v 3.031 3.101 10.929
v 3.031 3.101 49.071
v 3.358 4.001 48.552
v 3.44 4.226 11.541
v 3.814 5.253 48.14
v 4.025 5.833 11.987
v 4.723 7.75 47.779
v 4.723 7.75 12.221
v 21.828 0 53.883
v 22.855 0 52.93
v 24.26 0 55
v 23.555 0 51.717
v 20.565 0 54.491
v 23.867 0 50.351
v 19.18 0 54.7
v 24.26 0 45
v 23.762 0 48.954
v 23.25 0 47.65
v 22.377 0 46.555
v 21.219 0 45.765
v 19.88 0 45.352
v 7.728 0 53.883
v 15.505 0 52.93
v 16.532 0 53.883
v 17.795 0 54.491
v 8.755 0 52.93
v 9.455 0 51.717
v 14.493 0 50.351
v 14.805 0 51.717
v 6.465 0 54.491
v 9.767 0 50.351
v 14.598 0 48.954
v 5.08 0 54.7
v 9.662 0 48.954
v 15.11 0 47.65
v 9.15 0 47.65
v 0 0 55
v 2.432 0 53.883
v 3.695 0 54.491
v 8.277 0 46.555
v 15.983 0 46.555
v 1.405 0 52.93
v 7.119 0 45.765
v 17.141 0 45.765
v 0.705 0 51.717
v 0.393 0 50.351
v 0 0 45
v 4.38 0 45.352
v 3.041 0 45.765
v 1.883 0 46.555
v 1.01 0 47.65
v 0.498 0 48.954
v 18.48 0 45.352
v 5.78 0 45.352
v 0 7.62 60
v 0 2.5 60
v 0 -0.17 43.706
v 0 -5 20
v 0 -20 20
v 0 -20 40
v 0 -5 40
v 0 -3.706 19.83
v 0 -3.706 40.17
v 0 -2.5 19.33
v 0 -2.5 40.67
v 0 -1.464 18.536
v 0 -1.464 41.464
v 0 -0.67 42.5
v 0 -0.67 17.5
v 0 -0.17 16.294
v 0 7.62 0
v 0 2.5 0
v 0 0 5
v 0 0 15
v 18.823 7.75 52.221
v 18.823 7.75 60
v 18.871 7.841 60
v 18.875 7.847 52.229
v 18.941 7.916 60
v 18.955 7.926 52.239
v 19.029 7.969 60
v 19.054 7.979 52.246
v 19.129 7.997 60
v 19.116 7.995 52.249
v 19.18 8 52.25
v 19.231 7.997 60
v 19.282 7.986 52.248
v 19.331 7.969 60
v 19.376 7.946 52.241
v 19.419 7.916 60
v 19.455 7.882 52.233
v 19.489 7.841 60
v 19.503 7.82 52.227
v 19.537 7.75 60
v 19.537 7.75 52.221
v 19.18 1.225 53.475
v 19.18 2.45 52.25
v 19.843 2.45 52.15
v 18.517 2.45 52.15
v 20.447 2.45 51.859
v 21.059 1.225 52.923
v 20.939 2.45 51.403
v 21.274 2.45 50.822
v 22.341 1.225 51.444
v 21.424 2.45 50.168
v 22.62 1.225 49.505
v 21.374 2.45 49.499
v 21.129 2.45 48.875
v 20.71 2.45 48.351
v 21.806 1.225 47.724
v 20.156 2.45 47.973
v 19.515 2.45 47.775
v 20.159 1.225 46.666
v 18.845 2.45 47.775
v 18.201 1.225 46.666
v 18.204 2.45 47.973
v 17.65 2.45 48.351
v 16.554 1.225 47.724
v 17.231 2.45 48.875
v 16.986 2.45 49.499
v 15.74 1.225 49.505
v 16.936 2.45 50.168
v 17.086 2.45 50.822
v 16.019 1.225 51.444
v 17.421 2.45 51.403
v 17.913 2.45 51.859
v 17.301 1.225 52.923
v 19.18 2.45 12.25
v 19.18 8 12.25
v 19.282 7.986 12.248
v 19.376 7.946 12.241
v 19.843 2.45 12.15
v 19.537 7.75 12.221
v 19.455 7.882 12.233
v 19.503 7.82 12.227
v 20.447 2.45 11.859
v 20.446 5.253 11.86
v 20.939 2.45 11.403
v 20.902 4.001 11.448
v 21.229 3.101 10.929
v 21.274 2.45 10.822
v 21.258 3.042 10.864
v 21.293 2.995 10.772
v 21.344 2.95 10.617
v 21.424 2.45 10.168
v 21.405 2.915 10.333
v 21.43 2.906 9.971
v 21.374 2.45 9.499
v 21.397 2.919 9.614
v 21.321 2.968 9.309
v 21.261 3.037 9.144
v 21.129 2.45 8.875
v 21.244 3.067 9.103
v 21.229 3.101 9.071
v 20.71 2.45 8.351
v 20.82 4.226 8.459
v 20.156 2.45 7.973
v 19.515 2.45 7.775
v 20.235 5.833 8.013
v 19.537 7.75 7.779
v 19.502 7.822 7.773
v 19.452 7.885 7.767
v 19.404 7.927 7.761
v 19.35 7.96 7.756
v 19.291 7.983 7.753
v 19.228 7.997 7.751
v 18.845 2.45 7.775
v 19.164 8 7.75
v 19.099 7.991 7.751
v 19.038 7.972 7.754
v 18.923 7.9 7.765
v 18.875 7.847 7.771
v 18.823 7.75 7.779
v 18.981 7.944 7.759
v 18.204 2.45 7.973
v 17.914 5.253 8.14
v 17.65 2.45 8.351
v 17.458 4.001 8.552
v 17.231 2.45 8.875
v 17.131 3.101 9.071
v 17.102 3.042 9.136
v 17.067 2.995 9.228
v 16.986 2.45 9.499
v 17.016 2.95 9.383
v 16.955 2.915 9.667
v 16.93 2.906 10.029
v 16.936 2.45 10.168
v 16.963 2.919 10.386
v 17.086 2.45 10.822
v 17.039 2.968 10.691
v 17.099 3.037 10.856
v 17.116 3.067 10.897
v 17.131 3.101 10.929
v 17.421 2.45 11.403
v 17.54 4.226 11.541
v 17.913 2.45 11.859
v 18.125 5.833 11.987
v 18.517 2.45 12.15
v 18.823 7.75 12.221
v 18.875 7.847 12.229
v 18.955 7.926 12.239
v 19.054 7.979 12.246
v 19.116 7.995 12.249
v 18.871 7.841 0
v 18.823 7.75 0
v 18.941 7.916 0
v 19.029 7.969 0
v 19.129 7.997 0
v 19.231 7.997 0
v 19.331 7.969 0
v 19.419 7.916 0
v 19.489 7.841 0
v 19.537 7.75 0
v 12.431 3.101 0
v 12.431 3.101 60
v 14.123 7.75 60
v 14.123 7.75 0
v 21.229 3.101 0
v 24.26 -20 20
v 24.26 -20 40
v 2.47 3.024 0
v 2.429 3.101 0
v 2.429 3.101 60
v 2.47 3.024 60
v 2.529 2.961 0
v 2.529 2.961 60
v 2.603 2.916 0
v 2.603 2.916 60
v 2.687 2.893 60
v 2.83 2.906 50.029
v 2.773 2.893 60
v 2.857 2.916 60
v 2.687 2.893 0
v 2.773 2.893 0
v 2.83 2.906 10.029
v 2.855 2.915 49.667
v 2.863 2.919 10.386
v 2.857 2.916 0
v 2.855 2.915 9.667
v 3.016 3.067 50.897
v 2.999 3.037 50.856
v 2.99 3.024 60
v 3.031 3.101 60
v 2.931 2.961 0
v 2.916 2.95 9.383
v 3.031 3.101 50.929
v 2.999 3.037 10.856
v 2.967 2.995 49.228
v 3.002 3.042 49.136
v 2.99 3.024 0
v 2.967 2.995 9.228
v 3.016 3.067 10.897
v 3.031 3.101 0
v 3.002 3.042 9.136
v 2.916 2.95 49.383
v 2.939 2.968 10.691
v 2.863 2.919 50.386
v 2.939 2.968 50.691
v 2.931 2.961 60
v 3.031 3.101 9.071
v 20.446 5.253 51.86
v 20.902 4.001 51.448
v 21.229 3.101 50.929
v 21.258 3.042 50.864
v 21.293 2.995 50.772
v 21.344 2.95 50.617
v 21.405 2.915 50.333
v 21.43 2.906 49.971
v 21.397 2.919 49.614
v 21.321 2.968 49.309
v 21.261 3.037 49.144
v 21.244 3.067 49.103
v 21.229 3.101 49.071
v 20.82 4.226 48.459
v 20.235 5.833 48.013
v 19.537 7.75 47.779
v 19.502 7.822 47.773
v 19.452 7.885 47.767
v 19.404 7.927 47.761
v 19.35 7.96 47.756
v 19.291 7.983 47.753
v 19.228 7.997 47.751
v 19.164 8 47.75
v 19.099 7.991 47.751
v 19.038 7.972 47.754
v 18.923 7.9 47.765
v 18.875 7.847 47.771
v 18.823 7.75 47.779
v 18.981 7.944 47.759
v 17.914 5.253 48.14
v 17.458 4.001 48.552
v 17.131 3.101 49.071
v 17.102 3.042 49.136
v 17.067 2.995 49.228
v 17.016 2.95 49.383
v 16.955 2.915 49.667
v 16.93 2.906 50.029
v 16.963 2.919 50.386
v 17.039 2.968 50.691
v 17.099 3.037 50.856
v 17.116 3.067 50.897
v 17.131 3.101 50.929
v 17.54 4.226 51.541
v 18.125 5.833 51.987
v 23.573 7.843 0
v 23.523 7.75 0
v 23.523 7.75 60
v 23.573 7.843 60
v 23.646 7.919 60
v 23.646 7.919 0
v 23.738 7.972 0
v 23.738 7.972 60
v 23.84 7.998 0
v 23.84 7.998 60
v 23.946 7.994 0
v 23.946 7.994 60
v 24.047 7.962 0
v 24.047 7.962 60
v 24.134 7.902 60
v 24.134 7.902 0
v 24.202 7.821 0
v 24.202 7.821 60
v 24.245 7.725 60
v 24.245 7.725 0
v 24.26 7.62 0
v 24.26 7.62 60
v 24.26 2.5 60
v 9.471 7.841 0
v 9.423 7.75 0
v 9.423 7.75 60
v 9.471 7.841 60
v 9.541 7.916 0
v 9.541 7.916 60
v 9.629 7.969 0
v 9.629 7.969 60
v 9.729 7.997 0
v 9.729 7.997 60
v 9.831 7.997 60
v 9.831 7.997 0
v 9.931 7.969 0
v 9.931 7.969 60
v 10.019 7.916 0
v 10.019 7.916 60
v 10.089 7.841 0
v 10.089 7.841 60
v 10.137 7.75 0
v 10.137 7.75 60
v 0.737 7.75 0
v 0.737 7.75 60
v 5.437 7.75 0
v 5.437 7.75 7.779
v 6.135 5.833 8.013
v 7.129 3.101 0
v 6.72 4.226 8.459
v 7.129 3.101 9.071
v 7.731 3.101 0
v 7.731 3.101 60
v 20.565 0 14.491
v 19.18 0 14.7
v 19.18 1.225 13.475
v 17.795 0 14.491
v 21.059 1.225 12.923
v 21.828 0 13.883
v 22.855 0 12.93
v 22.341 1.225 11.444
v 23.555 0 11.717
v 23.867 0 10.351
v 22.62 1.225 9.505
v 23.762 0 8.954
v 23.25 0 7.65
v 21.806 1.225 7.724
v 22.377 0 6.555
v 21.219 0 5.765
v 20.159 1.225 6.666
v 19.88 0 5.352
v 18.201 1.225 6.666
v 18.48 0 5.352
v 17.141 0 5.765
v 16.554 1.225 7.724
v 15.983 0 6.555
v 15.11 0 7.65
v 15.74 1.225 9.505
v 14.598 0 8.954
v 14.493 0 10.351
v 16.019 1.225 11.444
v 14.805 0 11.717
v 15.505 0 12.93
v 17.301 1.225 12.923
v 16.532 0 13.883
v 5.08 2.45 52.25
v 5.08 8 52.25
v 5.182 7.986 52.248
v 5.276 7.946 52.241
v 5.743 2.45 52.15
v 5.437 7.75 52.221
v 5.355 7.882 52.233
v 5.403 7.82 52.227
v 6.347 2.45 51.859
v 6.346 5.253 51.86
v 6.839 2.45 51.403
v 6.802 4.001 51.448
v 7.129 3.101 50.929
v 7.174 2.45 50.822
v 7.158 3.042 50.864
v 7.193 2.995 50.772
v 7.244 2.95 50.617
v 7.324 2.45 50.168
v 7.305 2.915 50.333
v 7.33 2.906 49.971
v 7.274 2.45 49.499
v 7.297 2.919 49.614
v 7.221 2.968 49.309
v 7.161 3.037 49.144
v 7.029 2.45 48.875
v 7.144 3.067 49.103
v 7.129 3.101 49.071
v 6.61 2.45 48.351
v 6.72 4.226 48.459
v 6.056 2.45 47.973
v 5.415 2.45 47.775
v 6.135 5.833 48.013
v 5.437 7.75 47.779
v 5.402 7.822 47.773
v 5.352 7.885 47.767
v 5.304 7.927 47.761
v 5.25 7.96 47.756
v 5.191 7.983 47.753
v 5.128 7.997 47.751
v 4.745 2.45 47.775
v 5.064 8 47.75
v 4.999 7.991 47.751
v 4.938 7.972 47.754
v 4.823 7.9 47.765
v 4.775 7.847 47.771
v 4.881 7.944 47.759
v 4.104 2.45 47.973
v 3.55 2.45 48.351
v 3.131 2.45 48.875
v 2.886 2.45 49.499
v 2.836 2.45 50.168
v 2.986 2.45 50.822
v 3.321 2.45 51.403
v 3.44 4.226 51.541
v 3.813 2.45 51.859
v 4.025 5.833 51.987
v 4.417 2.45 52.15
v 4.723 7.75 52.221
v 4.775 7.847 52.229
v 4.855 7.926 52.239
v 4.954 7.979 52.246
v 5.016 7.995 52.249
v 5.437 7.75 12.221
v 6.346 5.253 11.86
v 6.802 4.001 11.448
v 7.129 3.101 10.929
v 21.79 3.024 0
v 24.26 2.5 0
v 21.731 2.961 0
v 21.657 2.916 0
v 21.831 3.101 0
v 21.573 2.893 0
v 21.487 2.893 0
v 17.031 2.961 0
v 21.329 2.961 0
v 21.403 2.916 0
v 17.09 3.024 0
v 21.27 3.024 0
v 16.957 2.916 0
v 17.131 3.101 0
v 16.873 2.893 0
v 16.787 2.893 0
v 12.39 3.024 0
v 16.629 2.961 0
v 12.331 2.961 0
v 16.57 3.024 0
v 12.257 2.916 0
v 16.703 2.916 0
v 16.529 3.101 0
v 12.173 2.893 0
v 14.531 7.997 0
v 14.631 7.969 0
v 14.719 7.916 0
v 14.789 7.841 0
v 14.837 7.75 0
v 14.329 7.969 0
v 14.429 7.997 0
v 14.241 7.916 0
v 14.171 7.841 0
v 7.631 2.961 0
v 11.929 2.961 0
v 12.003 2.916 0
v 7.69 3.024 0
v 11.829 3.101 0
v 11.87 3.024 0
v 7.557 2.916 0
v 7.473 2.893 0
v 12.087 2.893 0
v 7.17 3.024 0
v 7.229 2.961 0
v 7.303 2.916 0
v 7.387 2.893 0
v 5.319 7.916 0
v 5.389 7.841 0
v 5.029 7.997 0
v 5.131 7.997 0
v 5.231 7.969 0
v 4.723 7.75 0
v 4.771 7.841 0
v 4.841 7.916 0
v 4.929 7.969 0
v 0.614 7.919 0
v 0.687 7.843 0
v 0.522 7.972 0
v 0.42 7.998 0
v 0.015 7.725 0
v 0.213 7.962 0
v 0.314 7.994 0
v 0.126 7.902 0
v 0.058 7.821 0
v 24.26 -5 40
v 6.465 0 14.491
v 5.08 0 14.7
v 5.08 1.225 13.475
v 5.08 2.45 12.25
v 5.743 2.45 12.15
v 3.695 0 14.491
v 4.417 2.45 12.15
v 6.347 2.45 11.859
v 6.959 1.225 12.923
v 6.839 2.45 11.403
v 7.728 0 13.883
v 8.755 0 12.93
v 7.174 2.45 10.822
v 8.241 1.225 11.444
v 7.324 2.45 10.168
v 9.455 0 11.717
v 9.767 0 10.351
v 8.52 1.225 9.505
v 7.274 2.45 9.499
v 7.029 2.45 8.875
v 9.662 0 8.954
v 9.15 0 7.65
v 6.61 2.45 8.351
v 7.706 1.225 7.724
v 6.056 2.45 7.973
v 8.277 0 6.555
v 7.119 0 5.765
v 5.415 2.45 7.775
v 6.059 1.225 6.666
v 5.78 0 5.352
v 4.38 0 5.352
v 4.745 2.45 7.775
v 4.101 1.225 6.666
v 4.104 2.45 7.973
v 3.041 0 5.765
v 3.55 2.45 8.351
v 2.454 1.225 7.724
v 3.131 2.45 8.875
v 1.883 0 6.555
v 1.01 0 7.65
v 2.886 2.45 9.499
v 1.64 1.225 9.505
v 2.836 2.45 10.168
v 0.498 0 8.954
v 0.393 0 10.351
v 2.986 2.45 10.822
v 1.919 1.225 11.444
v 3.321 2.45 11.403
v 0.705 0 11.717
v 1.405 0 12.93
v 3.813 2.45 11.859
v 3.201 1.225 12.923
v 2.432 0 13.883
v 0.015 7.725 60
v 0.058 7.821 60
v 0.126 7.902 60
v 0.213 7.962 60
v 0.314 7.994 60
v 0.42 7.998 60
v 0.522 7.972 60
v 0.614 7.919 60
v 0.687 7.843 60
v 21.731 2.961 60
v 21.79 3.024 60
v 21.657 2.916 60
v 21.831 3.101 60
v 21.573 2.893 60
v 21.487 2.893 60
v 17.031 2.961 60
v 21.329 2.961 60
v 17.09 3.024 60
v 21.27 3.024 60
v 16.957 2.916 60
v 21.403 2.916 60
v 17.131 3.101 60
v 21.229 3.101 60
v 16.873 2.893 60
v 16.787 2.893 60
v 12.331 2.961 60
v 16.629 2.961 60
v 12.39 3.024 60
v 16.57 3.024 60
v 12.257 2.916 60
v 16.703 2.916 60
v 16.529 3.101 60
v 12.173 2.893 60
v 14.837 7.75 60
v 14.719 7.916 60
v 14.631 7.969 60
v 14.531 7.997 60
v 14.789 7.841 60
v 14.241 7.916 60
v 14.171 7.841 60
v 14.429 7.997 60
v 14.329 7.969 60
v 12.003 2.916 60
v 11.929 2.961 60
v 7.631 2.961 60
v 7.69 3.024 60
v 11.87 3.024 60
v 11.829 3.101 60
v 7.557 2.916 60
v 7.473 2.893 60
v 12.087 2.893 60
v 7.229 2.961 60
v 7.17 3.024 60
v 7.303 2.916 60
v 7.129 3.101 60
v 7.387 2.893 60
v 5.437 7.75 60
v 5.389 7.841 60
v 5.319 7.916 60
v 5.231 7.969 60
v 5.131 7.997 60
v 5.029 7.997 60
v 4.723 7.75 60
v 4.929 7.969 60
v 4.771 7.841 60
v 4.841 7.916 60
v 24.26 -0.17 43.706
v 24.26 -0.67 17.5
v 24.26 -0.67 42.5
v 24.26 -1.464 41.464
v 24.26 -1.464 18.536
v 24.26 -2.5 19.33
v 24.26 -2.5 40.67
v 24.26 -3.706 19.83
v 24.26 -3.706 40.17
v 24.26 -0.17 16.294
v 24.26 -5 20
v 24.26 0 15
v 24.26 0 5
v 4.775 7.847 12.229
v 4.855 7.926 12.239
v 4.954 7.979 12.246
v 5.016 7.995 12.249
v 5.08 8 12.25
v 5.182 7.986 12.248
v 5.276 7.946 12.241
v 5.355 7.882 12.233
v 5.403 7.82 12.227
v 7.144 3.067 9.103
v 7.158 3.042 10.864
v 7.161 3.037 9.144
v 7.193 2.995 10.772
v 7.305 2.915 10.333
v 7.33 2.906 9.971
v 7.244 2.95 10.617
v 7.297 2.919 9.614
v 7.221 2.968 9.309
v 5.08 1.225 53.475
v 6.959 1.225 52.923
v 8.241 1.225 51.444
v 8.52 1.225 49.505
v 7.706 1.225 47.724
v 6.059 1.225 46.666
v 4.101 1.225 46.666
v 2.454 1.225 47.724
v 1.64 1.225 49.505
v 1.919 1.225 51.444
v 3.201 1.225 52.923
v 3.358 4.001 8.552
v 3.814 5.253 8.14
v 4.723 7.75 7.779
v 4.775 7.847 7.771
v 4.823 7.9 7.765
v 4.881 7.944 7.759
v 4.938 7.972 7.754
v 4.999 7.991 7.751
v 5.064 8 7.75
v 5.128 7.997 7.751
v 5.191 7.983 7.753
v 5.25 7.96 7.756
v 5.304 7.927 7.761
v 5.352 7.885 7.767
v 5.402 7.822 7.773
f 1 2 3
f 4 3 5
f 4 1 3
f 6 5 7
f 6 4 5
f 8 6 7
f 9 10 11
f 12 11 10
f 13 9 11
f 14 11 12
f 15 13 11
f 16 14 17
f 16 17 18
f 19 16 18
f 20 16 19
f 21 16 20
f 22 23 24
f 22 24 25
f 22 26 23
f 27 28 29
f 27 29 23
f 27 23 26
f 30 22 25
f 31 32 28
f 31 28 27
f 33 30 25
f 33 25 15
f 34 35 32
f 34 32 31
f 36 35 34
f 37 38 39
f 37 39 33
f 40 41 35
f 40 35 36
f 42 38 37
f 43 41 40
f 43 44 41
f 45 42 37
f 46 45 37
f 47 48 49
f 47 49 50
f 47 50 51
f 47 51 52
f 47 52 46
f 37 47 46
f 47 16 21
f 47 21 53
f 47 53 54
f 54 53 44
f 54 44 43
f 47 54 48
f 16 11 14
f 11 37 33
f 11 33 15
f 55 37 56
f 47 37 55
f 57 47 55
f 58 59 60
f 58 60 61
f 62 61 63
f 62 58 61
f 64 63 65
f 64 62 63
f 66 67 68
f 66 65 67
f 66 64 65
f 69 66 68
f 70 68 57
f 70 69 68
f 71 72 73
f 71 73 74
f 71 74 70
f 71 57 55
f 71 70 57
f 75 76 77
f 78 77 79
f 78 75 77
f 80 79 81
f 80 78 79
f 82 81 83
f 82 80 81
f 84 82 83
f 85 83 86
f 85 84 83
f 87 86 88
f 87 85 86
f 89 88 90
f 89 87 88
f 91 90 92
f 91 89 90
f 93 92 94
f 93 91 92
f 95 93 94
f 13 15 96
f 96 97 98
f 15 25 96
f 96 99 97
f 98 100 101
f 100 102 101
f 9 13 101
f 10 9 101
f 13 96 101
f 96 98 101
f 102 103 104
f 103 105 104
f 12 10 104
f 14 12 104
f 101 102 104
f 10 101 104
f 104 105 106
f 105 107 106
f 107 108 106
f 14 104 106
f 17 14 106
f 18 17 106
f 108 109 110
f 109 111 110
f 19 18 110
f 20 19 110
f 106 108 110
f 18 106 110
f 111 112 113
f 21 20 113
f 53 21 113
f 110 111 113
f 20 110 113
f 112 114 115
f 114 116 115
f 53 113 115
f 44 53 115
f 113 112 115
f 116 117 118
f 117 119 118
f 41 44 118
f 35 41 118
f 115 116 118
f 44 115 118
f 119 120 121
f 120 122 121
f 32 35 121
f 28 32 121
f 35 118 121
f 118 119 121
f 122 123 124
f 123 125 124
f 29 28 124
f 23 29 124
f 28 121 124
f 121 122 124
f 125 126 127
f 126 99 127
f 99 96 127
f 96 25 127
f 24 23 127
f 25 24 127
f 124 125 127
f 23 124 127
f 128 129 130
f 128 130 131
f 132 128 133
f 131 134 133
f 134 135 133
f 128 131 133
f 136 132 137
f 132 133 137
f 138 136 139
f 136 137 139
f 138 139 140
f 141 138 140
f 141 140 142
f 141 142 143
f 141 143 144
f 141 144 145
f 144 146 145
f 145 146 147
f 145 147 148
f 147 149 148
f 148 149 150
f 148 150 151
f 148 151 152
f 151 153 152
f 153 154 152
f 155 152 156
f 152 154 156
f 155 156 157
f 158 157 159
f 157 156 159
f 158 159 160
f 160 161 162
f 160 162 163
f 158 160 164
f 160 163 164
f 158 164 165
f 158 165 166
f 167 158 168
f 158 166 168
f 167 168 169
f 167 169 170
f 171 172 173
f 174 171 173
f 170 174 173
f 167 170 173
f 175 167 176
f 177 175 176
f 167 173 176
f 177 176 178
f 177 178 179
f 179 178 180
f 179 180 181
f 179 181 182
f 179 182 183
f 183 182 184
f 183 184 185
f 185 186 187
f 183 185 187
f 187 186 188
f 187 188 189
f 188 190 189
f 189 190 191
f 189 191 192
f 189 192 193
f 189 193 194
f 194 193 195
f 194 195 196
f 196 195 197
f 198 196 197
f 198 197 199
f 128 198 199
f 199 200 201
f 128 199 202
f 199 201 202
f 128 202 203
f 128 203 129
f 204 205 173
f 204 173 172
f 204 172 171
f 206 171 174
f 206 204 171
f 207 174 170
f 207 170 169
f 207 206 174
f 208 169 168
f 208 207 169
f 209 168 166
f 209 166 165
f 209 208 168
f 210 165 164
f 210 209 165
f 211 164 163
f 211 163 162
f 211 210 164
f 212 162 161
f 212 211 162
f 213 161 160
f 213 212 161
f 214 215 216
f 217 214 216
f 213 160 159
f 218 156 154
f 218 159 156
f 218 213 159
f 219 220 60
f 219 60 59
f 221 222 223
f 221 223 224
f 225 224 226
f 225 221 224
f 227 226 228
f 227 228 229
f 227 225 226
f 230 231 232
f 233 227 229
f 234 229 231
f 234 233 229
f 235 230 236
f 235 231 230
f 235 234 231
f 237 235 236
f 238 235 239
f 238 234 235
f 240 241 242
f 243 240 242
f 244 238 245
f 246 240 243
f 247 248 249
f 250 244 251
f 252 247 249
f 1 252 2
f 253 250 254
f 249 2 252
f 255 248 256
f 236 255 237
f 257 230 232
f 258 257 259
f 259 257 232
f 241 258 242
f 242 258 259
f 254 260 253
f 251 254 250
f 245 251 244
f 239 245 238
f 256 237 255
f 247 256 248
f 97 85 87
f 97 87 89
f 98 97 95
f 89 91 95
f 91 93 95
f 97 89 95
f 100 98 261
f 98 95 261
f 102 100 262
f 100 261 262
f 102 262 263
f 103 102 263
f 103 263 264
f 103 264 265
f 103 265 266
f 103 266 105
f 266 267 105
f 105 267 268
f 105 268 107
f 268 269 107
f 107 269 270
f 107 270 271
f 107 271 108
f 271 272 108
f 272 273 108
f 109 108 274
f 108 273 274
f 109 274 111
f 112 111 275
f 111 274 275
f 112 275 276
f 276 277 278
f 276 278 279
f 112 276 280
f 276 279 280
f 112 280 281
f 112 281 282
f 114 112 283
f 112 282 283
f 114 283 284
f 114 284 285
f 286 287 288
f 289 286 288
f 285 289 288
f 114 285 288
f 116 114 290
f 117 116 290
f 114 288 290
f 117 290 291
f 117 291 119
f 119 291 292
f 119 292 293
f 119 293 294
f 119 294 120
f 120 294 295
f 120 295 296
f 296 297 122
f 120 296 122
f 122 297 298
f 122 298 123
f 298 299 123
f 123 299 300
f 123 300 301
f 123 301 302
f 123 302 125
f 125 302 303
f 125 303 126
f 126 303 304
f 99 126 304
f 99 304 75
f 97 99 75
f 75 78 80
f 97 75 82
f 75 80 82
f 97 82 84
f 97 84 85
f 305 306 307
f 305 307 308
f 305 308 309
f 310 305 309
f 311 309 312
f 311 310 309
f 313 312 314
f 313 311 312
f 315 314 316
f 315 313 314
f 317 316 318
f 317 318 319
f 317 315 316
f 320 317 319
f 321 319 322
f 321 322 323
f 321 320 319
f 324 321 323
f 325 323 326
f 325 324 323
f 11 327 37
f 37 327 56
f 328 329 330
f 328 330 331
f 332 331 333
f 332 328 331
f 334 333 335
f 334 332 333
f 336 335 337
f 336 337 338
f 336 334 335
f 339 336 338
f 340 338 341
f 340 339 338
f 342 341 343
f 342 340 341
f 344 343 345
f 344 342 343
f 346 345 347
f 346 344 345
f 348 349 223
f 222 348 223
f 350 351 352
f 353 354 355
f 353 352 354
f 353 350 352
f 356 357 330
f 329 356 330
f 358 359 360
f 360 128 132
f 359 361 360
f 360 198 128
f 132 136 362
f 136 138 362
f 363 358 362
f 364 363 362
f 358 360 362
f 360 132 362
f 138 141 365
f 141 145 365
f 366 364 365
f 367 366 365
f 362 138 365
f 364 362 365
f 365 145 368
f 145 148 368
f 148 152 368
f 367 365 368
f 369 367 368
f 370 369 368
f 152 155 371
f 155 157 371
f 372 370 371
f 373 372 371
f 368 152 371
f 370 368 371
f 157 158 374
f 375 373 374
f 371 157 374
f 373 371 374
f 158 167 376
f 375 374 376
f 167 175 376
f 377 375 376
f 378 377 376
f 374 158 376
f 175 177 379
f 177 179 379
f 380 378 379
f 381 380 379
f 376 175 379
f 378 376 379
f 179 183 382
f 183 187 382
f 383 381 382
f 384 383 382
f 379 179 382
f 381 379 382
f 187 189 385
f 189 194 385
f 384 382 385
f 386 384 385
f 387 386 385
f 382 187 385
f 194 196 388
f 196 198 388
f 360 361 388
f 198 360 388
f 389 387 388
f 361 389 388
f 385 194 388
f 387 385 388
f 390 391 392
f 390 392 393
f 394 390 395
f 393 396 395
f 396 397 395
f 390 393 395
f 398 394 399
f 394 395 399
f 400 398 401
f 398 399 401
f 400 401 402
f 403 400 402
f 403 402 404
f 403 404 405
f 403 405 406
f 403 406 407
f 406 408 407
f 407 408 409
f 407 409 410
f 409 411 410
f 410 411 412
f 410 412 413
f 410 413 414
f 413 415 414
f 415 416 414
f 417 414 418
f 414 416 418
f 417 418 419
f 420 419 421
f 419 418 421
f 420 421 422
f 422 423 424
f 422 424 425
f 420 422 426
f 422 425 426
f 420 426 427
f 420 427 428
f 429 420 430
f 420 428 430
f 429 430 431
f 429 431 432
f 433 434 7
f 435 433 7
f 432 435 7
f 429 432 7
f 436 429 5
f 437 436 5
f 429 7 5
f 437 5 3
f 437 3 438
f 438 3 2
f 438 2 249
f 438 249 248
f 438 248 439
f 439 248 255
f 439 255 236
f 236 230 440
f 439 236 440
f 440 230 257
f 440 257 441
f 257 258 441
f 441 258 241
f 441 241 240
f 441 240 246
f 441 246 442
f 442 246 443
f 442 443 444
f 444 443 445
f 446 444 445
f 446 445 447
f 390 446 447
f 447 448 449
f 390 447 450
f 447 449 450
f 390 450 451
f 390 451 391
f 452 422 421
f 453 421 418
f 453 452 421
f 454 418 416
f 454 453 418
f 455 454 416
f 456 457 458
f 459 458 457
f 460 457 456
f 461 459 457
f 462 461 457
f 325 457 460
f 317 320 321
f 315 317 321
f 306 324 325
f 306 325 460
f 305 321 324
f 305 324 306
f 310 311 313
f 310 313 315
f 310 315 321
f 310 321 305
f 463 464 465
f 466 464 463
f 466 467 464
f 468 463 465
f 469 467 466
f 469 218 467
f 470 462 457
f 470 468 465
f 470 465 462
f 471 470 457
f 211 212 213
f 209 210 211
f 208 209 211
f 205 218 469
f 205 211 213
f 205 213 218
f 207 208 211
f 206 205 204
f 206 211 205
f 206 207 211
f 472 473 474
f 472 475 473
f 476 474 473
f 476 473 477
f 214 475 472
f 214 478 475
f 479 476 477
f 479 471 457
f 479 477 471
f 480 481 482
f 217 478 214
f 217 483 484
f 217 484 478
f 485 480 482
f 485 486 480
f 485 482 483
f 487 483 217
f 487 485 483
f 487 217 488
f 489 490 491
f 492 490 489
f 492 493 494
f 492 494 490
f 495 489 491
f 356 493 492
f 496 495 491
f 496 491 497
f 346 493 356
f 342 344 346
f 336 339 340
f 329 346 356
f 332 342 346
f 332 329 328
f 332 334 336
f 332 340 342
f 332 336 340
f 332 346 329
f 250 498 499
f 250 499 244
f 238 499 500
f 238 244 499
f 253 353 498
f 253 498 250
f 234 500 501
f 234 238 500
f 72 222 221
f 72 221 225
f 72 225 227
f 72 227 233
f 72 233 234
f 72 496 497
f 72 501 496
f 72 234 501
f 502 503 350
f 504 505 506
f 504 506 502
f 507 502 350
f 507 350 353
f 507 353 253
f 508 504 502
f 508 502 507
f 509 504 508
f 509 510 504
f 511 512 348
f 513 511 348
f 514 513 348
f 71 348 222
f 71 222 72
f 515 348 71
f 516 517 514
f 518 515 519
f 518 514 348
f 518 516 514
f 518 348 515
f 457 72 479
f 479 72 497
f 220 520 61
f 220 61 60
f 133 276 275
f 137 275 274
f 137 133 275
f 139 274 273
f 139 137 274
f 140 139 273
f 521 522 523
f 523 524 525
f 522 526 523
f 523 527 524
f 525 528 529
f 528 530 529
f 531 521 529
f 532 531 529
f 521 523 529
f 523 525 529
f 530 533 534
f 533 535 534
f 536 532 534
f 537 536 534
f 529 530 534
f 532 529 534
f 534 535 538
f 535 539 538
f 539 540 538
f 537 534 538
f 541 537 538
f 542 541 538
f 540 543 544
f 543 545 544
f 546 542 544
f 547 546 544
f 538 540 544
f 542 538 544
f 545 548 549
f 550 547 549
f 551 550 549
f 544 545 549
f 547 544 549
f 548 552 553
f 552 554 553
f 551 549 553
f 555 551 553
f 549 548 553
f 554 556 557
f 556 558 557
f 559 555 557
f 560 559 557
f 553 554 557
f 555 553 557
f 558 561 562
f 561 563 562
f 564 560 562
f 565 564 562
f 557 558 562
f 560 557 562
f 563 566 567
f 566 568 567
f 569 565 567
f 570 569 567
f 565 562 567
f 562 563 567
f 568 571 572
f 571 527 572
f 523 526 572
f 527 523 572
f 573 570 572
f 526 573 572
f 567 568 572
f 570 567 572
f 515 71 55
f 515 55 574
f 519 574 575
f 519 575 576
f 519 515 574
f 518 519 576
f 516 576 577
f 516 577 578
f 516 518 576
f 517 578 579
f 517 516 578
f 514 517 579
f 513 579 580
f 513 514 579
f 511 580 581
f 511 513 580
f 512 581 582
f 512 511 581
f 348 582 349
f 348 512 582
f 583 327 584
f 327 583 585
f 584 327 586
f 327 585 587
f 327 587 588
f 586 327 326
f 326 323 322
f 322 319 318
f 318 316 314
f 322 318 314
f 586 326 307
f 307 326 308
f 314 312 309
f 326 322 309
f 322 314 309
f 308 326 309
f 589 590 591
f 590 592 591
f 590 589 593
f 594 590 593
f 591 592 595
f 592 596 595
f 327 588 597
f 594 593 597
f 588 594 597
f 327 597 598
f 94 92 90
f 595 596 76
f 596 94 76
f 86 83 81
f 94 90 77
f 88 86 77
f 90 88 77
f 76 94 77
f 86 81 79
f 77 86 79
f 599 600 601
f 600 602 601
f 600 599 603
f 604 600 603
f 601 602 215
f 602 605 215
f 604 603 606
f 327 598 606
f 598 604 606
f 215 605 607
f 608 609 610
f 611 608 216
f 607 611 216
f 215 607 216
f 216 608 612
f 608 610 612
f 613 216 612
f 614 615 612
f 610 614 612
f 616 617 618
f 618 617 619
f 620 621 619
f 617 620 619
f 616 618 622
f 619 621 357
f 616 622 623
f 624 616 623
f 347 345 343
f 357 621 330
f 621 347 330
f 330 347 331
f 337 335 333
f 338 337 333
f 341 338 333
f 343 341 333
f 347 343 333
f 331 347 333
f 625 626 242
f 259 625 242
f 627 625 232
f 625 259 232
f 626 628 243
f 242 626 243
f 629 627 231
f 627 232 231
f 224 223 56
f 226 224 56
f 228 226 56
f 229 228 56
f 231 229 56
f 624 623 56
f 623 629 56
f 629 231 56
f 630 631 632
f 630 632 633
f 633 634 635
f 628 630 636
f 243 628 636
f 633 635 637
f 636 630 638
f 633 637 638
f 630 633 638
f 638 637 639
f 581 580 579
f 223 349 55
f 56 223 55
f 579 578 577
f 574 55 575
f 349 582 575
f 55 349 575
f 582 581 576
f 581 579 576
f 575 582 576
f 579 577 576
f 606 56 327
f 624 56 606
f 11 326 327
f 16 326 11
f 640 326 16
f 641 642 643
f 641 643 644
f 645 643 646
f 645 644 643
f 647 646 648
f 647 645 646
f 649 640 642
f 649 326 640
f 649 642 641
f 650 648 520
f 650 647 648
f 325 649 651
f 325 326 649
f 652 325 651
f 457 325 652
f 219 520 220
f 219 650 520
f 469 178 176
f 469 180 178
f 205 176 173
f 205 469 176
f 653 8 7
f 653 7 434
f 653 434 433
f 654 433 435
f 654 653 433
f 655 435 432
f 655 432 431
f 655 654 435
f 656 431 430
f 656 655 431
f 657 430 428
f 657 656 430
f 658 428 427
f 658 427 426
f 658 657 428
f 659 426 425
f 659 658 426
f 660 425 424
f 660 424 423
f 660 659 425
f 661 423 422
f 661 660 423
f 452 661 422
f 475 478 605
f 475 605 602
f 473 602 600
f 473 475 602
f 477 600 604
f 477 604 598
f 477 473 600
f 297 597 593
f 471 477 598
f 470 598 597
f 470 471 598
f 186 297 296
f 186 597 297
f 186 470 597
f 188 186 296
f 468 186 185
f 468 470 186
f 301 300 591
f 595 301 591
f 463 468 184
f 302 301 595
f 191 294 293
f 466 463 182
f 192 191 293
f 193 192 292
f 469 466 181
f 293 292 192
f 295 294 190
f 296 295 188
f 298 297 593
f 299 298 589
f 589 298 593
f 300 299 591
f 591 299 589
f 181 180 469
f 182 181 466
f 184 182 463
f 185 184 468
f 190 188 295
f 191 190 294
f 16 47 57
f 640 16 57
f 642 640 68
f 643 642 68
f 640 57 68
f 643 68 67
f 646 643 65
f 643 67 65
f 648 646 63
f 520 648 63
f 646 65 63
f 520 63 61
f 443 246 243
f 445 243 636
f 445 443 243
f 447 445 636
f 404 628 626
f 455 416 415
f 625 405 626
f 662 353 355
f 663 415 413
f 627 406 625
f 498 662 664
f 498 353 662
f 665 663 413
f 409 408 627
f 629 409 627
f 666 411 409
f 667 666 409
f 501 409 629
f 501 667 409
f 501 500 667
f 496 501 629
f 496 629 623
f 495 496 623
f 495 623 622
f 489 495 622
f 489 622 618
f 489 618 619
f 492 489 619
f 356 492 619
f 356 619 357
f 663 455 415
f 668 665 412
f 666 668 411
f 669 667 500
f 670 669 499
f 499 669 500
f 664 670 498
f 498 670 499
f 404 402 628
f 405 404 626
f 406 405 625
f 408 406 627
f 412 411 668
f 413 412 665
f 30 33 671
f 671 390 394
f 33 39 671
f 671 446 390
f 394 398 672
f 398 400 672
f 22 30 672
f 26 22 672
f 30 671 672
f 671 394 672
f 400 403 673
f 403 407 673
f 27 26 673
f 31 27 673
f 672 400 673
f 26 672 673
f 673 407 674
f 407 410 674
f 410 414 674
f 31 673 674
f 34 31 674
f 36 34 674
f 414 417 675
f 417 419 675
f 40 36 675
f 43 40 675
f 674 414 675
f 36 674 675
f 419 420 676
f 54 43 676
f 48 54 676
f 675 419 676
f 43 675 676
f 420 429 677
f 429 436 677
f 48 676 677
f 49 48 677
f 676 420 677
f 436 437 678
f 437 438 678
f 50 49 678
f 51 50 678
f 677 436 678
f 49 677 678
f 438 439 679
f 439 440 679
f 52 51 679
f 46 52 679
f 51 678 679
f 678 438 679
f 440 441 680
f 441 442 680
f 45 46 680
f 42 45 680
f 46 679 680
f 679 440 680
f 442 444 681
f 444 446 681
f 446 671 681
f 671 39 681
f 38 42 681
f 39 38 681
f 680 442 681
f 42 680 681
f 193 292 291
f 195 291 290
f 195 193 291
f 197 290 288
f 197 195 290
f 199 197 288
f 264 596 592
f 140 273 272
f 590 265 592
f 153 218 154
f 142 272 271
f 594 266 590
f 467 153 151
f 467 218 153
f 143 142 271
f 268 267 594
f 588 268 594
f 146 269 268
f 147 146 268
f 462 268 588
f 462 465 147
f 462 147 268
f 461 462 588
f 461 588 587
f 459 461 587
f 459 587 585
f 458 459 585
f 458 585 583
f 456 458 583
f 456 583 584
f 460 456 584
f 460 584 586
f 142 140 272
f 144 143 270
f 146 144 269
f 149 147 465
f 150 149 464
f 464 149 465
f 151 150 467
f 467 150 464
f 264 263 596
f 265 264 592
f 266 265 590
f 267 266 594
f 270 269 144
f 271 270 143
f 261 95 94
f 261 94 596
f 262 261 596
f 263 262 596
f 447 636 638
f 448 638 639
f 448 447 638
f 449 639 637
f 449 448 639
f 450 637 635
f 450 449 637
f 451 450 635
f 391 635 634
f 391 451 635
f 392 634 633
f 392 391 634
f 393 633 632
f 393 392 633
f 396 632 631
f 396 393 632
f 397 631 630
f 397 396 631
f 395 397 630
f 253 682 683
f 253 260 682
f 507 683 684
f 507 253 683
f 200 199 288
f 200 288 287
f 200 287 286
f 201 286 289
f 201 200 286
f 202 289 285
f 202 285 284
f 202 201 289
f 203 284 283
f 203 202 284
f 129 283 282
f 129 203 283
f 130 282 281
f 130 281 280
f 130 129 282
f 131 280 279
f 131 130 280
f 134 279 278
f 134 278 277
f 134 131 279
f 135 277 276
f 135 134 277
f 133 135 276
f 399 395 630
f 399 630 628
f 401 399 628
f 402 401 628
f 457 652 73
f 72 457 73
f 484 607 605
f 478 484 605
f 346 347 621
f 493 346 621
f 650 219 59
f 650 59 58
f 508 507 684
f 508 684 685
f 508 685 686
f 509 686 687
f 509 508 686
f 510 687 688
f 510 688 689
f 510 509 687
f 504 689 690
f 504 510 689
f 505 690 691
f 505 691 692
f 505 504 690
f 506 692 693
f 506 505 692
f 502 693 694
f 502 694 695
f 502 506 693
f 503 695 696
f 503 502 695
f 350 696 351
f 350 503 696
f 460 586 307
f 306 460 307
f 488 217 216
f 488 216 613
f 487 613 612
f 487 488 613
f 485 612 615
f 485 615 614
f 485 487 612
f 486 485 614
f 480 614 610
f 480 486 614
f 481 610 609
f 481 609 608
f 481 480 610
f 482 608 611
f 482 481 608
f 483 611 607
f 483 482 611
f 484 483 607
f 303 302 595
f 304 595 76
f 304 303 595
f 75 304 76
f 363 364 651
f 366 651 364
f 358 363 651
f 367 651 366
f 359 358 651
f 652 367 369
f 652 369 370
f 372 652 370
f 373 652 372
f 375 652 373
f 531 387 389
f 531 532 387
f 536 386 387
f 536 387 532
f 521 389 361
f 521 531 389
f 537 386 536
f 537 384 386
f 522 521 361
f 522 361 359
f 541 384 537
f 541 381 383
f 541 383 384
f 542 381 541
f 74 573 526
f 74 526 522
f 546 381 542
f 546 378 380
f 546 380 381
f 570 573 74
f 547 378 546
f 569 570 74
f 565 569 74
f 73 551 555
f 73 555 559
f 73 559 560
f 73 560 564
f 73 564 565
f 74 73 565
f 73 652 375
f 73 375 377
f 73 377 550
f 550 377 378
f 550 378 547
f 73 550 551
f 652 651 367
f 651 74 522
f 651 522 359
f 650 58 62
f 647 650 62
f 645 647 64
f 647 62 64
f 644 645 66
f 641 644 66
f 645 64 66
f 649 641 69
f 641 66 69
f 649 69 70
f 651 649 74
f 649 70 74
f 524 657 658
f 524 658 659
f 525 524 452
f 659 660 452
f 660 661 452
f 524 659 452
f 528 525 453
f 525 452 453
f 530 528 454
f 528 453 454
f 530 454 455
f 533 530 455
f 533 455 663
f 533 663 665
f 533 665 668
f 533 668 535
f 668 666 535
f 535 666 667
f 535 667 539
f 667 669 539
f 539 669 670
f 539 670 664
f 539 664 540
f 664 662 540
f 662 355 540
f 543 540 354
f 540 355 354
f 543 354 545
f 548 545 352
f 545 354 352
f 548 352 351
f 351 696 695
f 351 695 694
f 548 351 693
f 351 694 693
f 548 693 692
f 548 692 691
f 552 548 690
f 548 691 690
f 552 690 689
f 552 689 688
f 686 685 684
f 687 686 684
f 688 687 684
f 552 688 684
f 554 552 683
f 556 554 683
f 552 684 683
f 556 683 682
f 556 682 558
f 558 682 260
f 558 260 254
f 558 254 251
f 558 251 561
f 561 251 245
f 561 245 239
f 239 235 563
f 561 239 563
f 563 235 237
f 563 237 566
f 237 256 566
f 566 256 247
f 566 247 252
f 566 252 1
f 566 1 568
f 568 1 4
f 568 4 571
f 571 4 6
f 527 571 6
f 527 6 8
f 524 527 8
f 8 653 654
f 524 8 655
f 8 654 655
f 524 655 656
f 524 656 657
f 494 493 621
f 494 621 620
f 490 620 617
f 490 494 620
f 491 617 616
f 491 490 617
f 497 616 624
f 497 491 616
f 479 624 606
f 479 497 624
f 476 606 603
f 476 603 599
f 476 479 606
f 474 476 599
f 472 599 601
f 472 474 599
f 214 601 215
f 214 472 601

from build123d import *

# Parameters (mm, degrees)
EXTRUDE_1_DEPTH             = 60
HOLE_WIZARD_M41_D           = 4.5
HOLE_WIZARD_M41_CSINK_D     = 9.4
HOLE_WIZARD_M41_CSINK_ANGLE = 90
EXTRUDE_2_DEPTH             = 24.26
CHAMFER_1_SIZE              = 2.5
CHAMFER_1_SIZE2             = 5
CHAMFER_2_SIZE              = 5
CHAMFER_2_SIZE2             = 2.5


with BuildPart() as part:
    # Эскиз1 → Бобышка-Вытянуть1 (new body)
    with BuildSketch(Plane.XY):
        with BuildLine():
            Line((0.737083196, 7.749967654), (2.429298361, 3.100644699))
            ThreePointArc((2.429298361, 3.100644699), (2.73, 2.890091144), (3.030701639, 3.100644699))
            Line((3.030701639, 3.100644699), (4.722916804, 7.749967654))
            ThreePointArc((4.722916804, 7.749967654), (5.08, 8), (5.437083196, 7.749967654))
            Line((5.437083196, 7.749967654), (7.129298361, 3.100644699))
            ThreePointArc((7.129298361, 3.100644699), (7.43, 2.890091144), (7.730701639, 3.100644699))
            Line((7.730701639, 3.100644699), (9.422916804, 7.749967654))
            ThreePointArc((9.422916804, 7.749967654), (9.78, 8), (10.137083196, 7.749967654))
            Line((10.137083196, 7.749967654), (11.829298361, 3.100644699))
            ThreePointArc((11.829298361, 3.100644699), (12.13, 2.890091144), (12.430701639, 3.100644699))
            Line((12.430701639, 3.100644699), (14.122916804, 7.749967654))
            ThreePointArc((14.122916804, 7.749967654), (14.48, 8), (14.837083196, 7.749967654))
            Line((14.837083196, 7.749967654), (16.529298361, 3.100644699))
            ThreePointArc((16.529298361, 3.100644699), (16.83, 2.890091144), (17.130701639, 3.100644699))
            Line((17.130701639, 3.100644699), (18.822916804, 7.749967654))
            ThreePointArc((18.822916804, 7.749967654), (19.18, 8), (19.537083196, 7.749967654))
            Line((19.537083196, 7.749967654), (21.229298361, 3.100644699))
            ThreePointArc((21.229298361, 3.100644699), (21.53, 2.890091144), (21.830701639, 3.100644699))
            Line((21.830701639, 3.100644699), (23.522916804, 7.749967654))
            ThreePointArc((23.522916804, 7.749967654), (23.945986308, 7.994226946), (24.26, 7.62))
            Line((24.26, 7.62), (24.26, 0))
            Line((24.26, 0), (0, 0))
            Line((0, 0), (0, 7.62))
            ThreePointArc((0, 7.62), (0.314013692, 7.994226946), (0.737083196, 7.749967654))
        make_face()
    extrude(amount=EXTRUDE_1_DEPTH)

    # Зенковка для  винта с плоской головкой M41 (through all)
    with Locations(Plane(origin=(5.08, 0, 50), x_dir=(0, 0, -1), z_dir=(0, -1, 0))):
        with Locations((0, 0), (0, 14.1), (40, 14.1), (40, 0)):
            CounterSinkHole(HOLE_WIZARD_M41_D / 2, HOLE_WIZARD_M41_CSINK_D / 2, counter_sink_angle=HOLE_WIZARD_M41_CSINK_ANGLE)

    # Эскиз6 → Бобышка-Вытянуть2 (add, through all)
    with BuildSketch(Plane.ZY):
        with BuildLine():
            Line((40, -5), (40, -20))
            Line((40, -20), (20, -20))
            Line((20, -20), (20, -5))
            ThreePointArc((20, -5), (18.535533906, -1.464466094), (15, 0))
            Line((15, 0), (45, 0))
            ThreePointArc((45, 0), (41.464466094, -1.464466094), (40, -5))
        make_face()
    extrude(amount=-EXTRUDE_2_DEPTH)

    # Фаска1
    chamfer_1_edges = [part.edges().sort_by_distance(p)[0] for p in [
        (12.13, 0, 0),
    ]]
    chamfer_1_side = [part.faces().sort_by_distance(p)[0] for p in [
        (1.343146193, 5.337937092, 0),
    ]]
    chamfer(chamfer_1_edges, length=CHAMFER_1_SIZE, length2=CHAMFER_1_SIZE2, reference=chamfer_1_side[0])

    # Фаска2
    chamfer_2_edges = [part.edges().sort_by_distance(p)[0] for p in [
        (12.13, 0, 60),
    ]]
    chamfer_2_side = [part.faces().sort_by_distance(p)[0] for p in [
        (12.13, 0, 54.04145744),
    ]]
    chamfer(chamfer_2_edges, length=CHAMFER_2_SIZE, length2=CHAMFER_2_SIZE2, reference=chamfer_2_side[0])


solid = part.part
